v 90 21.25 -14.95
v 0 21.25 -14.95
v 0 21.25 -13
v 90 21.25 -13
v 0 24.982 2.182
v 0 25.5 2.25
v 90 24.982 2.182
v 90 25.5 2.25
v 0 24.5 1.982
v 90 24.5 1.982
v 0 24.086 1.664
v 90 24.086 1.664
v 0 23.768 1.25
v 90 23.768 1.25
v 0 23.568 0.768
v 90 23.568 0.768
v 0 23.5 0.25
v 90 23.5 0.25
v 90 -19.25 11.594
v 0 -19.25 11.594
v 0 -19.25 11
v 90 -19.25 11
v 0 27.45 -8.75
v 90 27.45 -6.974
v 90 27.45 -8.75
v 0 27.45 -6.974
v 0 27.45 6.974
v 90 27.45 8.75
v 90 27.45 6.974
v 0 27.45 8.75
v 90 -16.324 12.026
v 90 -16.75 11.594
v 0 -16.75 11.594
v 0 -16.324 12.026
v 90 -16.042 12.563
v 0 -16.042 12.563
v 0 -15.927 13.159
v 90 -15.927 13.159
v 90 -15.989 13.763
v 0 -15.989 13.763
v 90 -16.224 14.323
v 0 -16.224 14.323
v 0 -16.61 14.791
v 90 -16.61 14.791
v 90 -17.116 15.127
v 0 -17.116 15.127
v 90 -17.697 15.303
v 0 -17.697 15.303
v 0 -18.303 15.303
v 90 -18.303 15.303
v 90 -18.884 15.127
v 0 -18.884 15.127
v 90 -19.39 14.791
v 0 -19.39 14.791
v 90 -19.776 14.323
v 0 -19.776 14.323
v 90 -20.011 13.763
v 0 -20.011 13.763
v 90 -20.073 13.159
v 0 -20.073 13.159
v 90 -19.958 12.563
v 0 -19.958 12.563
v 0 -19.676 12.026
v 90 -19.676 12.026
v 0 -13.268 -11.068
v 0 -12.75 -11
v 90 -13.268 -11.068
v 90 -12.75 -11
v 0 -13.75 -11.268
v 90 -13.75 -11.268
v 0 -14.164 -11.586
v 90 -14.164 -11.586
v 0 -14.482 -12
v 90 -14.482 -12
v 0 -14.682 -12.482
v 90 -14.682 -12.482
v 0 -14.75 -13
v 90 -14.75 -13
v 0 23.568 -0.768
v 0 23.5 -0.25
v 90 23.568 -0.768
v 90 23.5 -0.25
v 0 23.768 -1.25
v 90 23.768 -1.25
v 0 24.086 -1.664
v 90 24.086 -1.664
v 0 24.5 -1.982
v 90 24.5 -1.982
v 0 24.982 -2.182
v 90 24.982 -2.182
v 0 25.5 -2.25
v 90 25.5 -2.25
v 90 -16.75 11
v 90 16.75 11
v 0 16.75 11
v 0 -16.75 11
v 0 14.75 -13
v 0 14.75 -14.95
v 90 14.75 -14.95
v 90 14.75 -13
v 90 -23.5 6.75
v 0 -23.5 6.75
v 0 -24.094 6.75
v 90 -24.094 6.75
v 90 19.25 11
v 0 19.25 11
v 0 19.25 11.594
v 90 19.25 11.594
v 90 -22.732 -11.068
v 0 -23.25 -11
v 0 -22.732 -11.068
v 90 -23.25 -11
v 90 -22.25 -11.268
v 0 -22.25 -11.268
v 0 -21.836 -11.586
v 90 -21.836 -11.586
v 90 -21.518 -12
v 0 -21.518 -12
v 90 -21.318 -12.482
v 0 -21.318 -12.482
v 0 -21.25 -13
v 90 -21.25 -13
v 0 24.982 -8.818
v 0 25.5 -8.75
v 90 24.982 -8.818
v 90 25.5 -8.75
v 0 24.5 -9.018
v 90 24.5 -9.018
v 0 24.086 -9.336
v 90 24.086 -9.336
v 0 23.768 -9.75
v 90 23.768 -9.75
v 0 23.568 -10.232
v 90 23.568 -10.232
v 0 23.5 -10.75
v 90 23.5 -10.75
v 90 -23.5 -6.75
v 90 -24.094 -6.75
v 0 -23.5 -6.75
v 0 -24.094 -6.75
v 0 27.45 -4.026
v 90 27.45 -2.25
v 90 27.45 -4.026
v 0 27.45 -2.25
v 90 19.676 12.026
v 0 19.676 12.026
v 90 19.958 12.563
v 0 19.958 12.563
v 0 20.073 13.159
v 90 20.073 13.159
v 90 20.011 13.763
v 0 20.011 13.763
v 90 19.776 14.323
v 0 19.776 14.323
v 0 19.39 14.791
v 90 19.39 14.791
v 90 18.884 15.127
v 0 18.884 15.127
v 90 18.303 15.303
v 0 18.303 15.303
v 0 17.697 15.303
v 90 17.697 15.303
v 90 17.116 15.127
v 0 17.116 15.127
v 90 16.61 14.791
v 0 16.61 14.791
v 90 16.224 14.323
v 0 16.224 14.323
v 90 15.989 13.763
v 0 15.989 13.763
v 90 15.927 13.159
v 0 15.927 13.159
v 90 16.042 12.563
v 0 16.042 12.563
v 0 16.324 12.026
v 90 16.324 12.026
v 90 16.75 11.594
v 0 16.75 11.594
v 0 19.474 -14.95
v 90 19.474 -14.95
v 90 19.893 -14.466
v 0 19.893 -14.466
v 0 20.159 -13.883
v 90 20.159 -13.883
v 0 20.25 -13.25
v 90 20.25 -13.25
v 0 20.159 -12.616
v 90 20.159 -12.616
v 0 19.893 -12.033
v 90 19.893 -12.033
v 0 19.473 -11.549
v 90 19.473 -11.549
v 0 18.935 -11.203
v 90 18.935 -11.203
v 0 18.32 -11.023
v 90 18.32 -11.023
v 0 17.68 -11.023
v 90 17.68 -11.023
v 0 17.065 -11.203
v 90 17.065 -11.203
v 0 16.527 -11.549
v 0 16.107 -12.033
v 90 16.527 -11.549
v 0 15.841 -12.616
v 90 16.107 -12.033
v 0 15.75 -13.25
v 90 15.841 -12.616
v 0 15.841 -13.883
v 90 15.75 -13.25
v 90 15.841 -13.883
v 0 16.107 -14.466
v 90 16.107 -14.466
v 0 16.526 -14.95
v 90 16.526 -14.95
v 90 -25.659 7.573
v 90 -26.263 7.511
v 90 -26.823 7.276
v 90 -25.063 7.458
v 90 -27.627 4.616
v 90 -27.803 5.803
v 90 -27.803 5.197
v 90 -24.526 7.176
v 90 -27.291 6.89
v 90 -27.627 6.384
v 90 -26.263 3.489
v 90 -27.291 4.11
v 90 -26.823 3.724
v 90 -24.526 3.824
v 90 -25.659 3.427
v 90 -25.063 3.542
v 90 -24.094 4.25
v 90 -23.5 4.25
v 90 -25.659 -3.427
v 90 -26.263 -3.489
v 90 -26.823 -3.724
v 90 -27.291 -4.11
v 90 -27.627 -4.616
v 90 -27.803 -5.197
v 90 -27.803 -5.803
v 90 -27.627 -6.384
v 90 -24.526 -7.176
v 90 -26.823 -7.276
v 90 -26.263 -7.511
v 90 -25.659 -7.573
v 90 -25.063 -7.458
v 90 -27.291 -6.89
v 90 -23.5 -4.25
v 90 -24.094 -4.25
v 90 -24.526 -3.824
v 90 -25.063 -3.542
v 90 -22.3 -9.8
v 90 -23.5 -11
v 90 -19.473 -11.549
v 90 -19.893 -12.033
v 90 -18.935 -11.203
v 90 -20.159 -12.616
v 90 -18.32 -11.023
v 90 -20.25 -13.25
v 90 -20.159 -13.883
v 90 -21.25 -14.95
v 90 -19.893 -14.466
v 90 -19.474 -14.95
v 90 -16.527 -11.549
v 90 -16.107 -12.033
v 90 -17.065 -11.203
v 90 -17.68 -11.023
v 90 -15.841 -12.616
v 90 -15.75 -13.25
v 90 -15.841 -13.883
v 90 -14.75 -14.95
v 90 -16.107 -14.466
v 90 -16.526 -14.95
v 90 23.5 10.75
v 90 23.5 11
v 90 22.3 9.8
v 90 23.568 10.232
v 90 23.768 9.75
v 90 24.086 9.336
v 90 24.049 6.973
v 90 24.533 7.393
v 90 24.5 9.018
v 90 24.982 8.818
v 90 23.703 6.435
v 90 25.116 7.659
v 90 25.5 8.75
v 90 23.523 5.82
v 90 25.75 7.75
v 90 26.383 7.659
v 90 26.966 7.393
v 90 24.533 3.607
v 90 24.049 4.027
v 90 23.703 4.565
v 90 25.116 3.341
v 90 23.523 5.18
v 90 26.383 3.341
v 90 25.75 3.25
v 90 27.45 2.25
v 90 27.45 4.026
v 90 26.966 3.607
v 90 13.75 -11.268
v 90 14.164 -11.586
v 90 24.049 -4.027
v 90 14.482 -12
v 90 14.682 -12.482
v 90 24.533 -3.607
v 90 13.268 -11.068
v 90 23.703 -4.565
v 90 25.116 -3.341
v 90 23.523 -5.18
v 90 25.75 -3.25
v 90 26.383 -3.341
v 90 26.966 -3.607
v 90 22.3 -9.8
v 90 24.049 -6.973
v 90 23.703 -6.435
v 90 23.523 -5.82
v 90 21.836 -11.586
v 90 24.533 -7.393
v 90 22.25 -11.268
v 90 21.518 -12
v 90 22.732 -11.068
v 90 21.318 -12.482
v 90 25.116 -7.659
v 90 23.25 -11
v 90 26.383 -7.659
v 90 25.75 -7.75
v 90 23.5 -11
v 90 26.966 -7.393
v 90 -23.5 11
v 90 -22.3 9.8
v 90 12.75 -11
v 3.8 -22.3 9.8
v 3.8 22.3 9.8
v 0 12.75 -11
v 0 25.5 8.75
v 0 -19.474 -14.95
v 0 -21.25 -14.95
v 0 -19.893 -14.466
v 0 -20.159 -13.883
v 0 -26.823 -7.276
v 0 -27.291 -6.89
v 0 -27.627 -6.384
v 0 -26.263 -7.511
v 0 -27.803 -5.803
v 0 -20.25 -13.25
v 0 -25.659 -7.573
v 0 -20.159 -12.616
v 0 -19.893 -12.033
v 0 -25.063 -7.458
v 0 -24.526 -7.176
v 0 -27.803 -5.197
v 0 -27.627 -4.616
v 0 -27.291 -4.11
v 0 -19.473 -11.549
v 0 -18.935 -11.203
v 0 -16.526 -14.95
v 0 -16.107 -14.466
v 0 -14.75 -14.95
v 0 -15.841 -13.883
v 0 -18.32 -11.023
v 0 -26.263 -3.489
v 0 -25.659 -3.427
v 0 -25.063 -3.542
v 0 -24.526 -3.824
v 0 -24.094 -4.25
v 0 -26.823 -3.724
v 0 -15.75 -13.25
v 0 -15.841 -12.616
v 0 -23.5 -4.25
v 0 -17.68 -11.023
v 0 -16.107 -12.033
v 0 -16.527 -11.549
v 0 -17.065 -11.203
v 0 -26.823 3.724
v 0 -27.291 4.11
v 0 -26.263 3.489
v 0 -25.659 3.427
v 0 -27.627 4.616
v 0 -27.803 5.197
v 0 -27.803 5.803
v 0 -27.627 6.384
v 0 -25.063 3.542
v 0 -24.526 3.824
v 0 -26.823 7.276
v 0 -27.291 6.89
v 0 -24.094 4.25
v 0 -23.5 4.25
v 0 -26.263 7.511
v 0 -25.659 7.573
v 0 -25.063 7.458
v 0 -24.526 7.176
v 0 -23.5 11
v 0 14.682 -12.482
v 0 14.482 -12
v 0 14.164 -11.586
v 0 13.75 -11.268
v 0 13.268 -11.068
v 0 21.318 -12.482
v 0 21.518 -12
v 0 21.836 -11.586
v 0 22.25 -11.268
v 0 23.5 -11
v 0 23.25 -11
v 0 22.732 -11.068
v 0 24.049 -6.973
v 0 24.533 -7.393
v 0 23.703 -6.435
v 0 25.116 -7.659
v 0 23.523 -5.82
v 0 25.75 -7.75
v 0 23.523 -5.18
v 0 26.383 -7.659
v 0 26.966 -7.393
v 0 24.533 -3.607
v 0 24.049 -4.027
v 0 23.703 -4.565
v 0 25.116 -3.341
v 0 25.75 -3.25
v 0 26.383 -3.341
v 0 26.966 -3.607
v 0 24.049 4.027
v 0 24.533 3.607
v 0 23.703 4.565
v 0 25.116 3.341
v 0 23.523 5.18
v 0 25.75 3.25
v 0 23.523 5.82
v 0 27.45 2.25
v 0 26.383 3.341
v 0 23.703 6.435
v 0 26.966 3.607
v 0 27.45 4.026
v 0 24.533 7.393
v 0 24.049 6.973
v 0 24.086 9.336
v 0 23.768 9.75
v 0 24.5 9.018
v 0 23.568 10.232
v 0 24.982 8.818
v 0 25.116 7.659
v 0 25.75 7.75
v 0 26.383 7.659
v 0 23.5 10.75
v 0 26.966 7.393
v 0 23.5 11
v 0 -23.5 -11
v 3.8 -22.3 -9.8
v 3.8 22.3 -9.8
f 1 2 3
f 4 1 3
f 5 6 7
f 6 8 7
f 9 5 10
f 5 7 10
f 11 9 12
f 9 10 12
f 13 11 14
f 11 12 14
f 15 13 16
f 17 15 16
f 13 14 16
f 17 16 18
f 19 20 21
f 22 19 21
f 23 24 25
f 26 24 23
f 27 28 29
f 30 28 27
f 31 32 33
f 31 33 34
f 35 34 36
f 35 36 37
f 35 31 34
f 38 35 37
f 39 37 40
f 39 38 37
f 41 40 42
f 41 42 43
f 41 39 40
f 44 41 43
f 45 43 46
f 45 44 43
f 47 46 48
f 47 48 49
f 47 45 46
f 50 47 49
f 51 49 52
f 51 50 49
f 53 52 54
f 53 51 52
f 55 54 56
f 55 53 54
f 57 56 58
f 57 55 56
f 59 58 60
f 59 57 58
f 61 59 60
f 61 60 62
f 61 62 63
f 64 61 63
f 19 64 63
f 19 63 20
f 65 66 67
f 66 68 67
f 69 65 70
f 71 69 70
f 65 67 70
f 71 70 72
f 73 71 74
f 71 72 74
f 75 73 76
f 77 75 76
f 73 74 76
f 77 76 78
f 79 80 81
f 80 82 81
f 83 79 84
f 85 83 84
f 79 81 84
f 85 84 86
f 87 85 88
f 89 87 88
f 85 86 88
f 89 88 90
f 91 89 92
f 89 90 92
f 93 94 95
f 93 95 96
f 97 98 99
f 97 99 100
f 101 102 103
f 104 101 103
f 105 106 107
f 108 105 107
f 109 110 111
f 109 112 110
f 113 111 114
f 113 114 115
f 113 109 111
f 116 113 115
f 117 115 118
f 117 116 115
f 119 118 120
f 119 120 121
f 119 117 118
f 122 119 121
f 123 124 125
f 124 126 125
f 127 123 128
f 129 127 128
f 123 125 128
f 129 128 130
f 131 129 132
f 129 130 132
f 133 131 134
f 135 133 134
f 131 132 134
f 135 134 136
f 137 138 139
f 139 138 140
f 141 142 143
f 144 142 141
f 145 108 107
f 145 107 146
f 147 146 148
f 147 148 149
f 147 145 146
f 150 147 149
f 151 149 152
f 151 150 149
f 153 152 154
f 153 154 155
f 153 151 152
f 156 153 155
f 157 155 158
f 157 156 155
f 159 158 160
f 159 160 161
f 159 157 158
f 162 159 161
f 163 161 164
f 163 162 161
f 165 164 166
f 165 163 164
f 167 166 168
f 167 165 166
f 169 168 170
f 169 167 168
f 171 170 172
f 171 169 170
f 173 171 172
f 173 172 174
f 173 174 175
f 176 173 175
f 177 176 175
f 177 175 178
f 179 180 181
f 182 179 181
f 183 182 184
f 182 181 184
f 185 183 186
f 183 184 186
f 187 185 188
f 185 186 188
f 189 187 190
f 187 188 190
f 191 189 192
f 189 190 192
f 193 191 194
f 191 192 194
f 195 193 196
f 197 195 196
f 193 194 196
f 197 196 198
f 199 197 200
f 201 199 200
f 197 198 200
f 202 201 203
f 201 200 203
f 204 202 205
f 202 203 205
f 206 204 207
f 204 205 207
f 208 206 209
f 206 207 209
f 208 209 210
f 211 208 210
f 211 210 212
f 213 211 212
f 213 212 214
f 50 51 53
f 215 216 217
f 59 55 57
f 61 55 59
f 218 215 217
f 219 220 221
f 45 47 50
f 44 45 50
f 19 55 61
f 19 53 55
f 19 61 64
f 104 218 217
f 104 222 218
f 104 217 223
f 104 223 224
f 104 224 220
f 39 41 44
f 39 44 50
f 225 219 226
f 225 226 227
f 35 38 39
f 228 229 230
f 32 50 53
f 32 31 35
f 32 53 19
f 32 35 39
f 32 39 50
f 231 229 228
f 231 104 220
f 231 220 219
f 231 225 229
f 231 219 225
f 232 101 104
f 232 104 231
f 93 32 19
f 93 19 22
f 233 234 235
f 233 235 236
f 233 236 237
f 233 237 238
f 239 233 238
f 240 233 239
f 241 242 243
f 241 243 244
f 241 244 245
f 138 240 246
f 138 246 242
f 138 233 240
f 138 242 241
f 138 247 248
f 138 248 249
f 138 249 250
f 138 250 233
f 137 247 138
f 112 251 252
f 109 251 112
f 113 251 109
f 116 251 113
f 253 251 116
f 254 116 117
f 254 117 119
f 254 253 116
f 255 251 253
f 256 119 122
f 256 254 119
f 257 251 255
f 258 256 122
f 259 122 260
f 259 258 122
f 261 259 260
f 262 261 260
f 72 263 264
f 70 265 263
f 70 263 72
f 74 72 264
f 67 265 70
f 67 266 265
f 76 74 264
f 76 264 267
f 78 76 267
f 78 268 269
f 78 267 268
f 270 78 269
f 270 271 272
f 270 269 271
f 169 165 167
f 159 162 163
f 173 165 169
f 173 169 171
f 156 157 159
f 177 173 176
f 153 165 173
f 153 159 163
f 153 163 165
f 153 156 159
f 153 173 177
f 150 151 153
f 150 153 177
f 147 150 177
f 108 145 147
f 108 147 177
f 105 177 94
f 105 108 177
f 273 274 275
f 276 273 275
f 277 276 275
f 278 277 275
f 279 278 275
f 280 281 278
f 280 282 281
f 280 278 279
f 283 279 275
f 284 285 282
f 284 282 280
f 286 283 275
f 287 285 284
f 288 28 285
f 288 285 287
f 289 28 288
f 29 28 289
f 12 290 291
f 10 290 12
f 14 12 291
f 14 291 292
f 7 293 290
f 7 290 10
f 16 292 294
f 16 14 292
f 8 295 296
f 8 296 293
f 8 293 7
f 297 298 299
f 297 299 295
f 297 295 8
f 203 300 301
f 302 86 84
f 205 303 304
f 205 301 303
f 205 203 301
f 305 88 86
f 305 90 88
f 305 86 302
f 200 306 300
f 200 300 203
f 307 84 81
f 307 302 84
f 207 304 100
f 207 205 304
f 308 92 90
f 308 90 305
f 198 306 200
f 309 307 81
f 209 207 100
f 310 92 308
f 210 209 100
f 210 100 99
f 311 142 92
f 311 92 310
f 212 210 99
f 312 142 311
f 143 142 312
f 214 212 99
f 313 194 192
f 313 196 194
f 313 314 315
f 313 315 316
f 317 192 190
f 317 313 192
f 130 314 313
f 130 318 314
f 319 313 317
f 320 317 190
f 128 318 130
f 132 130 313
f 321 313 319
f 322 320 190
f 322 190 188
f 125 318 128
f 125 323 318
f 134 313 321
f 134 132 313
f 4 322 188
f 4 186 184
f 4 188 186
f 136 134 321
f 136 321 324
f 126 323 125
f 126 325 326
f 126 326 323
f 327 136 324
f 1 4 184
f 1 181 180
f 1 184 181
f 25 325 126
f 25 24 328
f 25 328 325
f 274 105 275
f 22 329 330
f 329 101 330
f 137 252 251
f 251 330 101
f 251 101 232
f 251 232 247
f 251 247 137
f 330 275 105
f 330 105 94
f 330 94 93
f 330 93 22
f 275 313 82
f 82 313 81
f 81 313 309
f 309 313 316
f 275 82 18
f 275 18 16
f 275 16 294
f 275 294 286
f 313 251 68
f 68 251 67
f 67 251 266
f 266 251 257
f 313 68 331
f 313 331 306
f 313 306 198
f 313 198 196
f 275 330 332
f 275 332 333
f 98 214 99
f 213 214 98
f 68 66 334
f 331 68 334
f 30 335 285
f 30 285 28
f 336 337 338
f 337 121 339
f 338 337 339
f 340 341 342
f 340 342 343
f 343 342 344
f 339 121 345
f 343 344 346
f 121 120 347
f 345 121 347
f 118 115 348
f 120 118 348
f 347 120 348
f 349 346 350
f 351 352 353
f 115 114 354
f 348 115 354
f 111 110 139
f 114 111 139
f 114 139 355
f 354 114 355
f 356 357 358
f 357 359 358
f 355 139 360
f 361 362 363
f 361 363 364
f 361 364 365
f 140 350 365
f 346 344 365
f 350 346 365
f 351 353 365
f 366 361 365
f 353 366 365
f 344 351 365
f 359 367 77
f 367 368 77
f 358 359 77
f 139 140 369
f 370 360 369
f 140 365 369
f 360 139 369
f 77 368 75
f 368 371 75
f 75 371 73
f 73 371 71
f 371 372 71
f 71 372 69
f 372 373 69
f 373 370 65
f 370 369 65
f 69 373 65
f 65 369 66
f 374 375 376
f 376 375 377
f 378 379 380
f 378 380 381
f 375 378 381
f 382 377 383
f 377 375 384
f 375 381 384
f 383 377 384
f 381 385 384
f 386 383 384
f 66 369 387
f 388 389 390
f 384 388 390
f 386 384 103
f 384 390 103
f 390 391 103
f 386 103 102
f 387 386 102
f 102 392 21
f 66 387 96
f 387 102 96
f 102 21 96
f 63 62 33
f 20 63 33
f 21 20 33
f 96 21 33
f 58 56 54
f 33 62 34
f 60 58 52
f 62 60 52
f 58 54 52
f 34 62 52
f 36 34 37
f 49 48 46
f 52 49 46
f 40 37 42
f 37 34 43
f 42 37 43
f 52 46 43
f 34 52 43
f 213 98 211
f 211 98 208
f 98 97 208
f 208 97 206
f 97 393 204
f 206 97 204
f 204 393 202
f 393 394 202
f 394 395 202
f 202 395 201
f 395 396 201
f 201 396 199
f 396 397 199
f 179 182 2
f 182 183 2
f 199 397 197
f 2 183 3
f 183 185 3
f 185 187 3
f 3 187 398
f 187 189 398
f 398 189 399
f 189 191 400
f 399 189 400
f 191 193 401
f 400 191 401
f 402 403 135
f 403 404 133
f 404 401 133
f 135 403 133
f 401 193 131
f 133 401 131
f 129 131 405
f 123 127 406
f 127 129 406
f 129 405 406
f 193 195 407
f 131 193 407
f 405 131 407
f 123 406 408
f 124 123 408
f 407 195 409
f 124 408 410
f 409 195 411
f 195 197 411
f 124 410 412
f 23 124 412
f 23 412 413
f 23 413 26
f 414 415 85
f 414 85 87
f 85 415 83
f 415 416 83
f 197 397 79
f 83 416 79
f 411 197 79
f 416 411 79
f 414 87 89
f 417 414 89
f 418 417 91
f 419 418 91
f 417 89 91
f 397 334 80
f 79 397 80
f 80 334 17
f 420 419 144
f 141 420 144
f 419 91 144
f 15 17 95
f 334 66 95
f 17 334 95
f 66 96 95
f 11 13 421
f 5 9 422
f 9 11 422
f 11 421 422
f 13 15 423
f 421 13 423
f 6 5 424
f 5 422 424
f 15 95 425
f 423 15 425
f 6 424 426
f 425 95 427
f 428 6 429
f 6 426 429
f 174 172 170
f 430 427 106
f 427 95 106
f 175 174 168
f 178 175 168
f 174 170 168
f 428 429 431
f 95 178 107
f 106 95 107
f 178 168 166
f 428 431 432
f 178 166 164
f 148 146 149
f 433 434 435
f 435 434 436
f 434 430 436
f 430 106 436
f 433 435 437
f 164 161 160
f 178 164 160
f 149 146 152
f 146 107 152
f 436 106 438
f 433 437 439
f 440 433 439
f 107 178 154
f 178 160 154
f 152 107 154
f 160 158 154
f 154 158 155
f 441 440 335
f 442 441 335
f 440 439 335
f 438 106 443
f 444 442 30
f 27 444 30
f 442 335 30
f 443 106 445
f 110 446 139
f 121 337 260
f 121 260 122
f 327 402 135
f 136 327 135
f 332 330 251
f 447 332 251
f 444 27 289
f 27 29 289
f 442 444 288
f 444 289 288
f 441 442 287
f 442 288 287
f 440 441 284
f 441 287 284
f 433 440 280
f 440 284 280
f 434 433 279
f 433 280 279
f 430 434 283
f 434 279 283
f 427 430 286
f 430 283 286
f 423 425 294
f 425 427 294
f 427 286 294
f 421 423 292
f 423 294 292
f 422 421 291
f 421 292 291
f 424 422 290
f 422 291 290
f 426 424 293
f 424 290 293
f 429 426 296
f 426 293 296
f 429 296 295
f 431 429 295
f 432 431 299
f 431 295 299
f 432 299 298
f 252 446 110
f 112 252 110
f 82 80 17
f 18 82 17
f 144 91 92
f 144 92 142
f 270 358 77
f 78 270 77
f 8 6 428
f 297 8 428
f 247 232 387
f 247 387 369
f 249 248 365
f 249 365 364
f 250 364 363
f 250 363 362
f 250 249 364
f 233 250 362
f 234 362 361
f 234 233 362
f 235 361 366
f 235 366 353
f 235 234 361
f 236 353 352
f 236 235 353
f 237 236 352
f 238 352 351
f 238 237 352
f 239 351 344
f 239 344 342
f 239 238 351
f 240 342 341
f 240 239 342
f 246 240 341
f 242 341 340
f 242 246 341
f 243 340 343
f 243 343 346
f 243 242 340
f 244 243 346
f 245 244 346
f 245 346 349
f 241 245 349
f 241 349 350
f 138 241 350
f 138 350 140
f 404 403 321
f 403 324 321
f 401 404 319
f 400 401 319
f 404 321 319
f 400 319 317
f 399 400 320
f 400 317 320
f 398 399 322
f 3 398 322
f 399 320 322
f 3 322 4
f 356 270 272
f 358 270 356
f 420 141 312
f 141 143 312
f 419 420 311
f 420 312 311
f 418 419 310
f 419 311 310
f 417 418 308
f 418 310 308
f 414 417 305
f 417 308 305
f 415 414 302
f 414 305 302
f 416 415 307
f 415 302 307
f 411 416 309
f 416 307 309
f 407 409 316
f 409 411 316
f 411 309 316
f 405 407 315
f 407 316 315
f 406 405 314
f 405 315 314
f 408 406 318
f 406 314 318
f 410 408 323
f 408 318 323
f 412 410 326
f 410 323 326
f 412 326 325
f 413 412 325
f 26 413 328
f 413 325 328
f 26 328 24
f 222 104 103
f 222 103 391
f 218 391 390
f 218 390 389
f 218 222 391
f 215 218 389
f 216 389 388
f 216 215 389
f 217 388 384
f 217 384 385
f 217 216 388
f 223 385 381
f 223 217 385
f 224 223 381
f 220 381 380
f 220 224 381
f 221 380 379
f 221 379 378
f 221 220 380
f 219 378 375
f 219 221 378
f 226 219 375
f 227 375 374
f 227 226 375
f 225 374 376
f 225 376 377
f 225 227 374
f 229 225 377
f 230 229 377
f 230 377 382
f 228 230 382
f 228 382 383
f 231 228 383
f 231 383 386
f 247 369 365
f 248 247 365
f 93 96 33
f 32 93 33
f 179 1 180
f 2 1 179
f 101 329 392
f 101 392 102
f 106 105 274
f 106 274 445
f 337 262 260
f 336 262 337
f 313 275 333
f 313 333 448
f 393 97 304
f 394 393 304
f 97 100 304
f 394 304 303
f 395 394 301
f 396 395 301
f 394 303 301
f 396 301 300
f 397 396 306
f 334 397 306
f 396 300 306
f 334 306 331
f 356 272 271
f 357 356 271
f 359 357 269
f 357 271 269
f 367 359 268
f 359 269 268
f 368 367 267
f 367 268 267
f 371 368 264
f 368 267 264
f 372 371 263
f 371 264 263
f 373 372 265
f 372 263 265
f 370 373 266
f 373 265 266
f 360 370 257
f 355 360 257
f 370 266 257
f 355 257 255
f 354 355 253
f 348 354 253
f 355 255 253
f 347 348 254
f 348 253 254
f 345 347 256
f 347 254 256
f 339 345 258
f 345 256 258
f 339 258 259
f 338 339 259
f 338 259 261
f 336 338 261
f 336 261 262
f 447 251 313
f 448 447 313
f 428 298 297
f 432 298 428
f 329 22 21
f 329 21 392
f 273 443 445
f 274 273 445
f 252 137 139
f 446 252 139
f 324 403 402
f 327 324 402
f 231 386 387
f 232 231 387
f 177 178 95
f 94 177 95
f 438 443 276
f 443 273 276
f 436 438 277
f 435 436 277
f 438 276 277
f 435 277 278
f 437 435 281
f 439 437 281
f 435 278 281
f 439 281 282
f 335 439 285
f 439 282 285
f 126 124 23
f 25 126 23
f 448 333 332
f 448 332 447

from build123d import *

# Parameters (mm, degrees)
EXTRUDE_1_DEPTH             = 90
SKETCH_2_W                  = 90
SKETCH_2_H                  = 17.75
EXTRUDE_2_DEPTH             = 8.2
SKETCH_3_W                  = 90
SKETCH_3_H                  = 50.95
EXTRUDE_3_DEPTH             = 8.2
SKETCH_4_W                  = 3.95
SKETCH_4_H                  = 29.5
CUT_EXTRUDE_1_DEPTH         = 91
SKETCH_5_W                  = 3.95
SKETCH_5_H                  = 6.2
CUT_EXTRUDE_2_DEPTH         = 91
SKETCH_6_W                  = 2.25
SKETCH_6_H                  = 3.95
CUT_EXTRUDE_3_DEPTH         = 91
SKETCH_7_W                  = 4.5
SKETCH_7_H                  = 3.95
CUT_EXTRUDE_4_DEPTH         = 91
SKETCH_8_W                  = 2.25
SKETCH_8_H                  = 3.95
CUT_EXTRUDE_5_DEPTH         = 91
SKETCH_9_W                  = 3.95
SKETCH_9_H                  = 2.25
CUT_EXTRUDE_6_DEPTH         = 91
SKETCH_10_W                 = 19.6
SKETCH_10_H                 = 44.6
CUT_EXTRUDE_7_DEPTH         = 86.2
HOLE_WIZARD_2_5_2_5_1_D     = 2.5
HOLE_WIZARD_2_5_2_5_1_DEPTH = 90
HOLE_WIZARD_4_5_4_5_1_D     = 4.5
HOLE_WIZARD_4_5_4_5_1_DEPTH = 90
FILLET_1_R                  = 2
FILLET_2_R                  = 2
SKETCH_17_R                 = 1.25
EXTRUDE_4_DEPTH             = 90


with BuildPart() as part:
    # Эскиз1 → Бобышка-Вытянуть1 (new body)
    with BuildSketch(Plane(origin=(90, 0, 0), x_dir=(0, 0, -1), z_dir=(1, 0, 0))):
        with BuildLine():
            Line((6.75, -24.093761792), (6.75, 19.25))
            Line((6.75, 19.25), (-11.593761792, 19.25))
            ThreePointArc((-11.593761792, 19.25), (-15.325, 18), (-11.593761792, 16.75))
            Line((-11.593761792, 16.75), (-11, 16.75))
            Line((-11, 16.75), (-11, -16.75))
            Line((-11, -16.75), (-11.593761792, -16.75))
            ThreePointArc((-11.593761792, -16.75), (-15.325, -18), (-11.593761792, -19.25))
            Line((-11.593761792, -19.25), (-11, -19.25))
            Line((-11, -19.25), (-11, -23.5))
            Line((-11, -23.5), (-6.75, -23.5))
            Line((-6.75, -23.5), (-6.75, -24.093761792))
            ThreePointArc((-6.75, -24.093761792), (-5.5, -27.825), (-4.25, -24.093761792))
            Line((-4.25, -24.093761792), (-4.25, -23.5))
            Line((-4.25, -23.5), (4.25, -23.5))
            Line((4.25, -23.5), (4.25, -24.093761792))
            ThreePointArc((4.25, -24.093761792), (5.5, -27.825), (6.75, -24.093761792))
        make_face()
    extrude(amount=-EXTRUDE_1_DEPTH)

    # Эскиз2 → Бобышка-Вытянуть2 (add)
    with BuildSketch(Plane(origin=(0, 19.25, 0), x_dir=(-1, 0, 0), z_dir=(0, 1, 0))):
        with Locations((-45, 2.125)):
            Rectangle(SKETCH_2_W, SKETCH_2_H)
    extrude(amount=EXTRUDE_2_DEPTH)

    # Эскиз3 → Бобышка-Вытянуть3 (add)
    with BuildSketch(Plane(origin=(0, 0, -6.75), x_dir=(-1, 0, 0), z_dir=(0, 0, -1))):
        with Locations((-45, 1.975)):
            Rectangle(SKETCH_3_W, SKETCH_3_H)
    extrude(amount=EXTRUDE_3_DEPTH)

    # Эскиз4 → Вырез-Вытянуть1 (cut, through all)
    with BuildSketch(Plane.ZY):
        with Locations((-12.975, 0)):
            Rectangle(SKETCH_4_W, SKETCH_4_H)
    extrude(amount=-CUT_EXTRUDE_1_DEPTH, mode=Mode.SUBTRACT)

    # Эскиз5 → Вырез-Вытянуть2 (cut, through all)
    with BuildSketch(Plane.ZY):
        with Locations((-12.975, 24.35)):
            Rectangle(SKETCH_5_W, SKETCH_5_H)
    extrude(amount=-CUT_EXTRUDE_2_DEPTH, mode=Mode.SUBTRACT)

    # Эскиз6 → Вырез-Вытянуть3 (cut, through all)
    with BuildSketch(Plane.ZY):
        with Locations((-9.875, 25.475)):
            Rectangle(SKETCH_6_W, SKETCH_6_H)
    extrude(amount=-CUT_EXTRUDE_3_DEPTH, mode=Mode.SUBTRACT)

    # Эскиз7 → Вырез-Вытянуть4 (cut, through all)
    with BuildSketch(Plane.ZY):
        with Locations((0, 25.475)):
            Rectangle(SKETCH_7_W, SKETCH_7_H)
    extrude(amount=-CUT_EXTRUDE_4_DEPTH, mode=Mode.SUBTRACT)

    # Эскиз8 → Вырез-Вытянуть5 (cut, through all)
    with BuildSketch(Plane.ZY):
        with Locations((9.875, 25.475)):
            Rectangle(SKETCH_8_W, SKETCH_8_H)
    extrude(amount=-CUT_EXTRUDE_5_DEPTH, mode=Mode.SUBTRACT)

    # Эскиз9 → Вырез-Вытянуть6 (cut, through all)
    with BuildSketch(Plane.ZY):
        with Locations((-12.975, -22.375)):
            Rectangle(SKETCH_9_W, SKETCH_9_H)
    extrude(amount=-CUT_EXTRUDE_6_DEPTH, mode=Mode.SUBTRACT)

    # Эскиз10 → Вырез-Вытянуть7 (cut)
    with BuildSketch(Plane(origin=(90, 0, 0), x_dir=(0, 0, -1), z_dir=(1, 0, 0))):
        Rectangle(SKETCH_10_W, SKETCH_10_H)
    extrude(amount=-CUT_EXTRUDE_7_DEPTH, mode=Mode.SUBTRACT)

    # Диаметр отверстия Ø2.5 (2.5)1
    with Locations(Plane(origin=(90, 0, 0), x_dir=(0, 0, -1), z_dir=(1, 0, 0))):
        with Locations((5.5, -25.75), (-13.25, -18), (-5.5, -25.75), (-13.25, 18)):
            Hole(HOLE_WIZARD_2_5_2_5_1_D / 2, depth=HOLE_WIZARD_2_5_2_5_1_DEPTH)

    # Диаметр отверстия Ø4.5 (4.5)1
    with Locations(Plane.ZY):
        with Locations((-13.25, -18), (-13.25, 18), (-5.5, 25.75), (5.5, 25.75)):
            Hole(HOLE_WIZARD_4_5_4_5_1_D / 2, depth=HOLE_WIZARD_4_5_4_5_1_DEPTH)

    # Скругление1
    fillet_1_edges = [part.edges().sort_by_distance(p)[0] for p in [
        (45, 23.5, 8.75),
    ]]
    fillet(fillet_1_edges, radius=FILLET_1_R)

    # Скругление2
    fillet_2_edges = [part.edges().sort_by_distance(p)[0] for p in [
        (45, 23.5, -8.75),
        (45, 23.5, 2.25),
        (45, 23.5, -2.25),
        (45, -21.25, -11),
        (45, 14.75, -11),
        (45, -14.75, -11),
        (45, 21.25, -11),
    ]]
    fillet(fillet_2_edges, radius=FILLET_2_R)

    # Эскиз17 → Бобышка-Вытянуть4 (add)
    with BuildSketch(Plane(origin=(90, 0, 0), x_dir=(0, 0, -1), z_dir=(1, 0, 0))):
        with Locations((5.5, -25.75)):
            Circle(SKETCH_17_R)
        with Locations((-5.5, -25.75)):
            Circle(SKETCH_17_R)
        with Locations((-13.25, -18)):
            Circle(SKETCH_17_R)
        with Locations((-13.25, 18)):
            Circle(SKETCH_17_R)
    extrude(amount=-EXTRUDE_4_DEPTH)


solid = part.part
